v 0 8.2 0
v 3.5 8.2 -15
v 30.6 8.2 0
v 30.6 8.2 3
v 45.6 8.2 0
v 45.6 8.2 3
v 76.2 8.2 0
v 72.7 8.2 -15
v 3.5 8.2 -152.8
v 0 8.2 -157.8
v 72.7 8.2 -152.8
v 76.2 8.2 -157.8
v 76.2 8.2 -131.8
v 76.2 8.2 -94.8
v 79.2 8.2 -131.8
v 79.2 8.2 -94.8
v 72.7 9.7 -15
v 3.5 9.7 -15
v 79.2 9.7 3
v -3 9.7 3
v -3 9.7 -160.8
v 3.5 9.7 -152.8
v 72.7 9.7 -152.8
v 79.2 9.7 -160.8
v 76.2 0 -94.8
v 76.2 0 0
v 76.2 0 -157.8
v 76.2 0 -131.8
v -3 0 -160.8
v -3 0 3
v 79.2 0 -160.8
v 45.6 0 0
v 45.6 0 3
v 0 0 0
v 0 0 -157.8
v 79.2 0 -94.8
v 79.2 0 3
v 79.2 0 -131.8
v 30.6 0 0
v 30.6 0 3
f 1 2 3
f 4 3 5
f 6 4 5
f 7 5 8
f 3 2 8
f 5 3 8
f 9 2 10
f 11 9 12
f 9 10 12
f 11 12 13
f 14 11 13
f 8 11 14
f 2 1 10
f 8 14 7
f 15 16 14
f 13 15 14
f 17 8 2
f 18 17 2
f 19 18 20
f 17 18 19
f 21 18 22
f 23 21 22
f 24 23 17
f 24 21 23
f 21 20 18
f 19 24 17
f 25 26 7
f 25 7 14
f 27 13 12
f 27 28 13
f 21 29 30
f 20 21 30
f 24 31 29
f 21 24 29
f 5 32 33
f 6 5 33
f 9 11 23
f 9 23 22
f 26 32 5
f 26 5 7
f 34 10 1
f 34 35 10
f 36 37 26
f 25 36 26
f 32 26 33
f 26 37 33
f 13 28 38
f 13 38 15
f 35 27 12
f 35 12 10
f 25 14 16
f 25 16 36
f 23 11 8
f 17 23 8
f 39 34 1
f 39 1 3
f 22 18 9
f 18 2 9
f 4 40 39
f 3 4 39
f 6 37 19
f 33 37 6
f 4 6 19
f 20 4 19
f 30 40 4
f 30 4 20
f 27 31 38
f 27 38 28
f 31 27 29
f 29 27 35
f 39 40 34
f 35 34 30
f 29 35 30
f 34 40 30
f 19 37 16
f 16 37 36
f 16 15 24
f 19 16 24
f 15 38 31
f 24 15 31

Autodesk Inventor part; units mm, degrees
ref_plane "YZ Plane" through (0, 0, 0) normal (1, 0, 0) x (0, 1, 0)
ref_plane "XZ Plane" through (0, 0, 0) normal (0, 1, 0) x (-1, 0, 0)
ref_plane "XY Plane" through (0, 0, 0) normal (0, 0, 1) x (1, 0, 0)
sketch "Sketch1" plane through (0, 0, 0) normal (0, 1, 0) x (-1, 0, 0)
  line L0 (0, 0) -> (-76.2, 0)
  line L1 (-76.2, 0) -> (-76.2, -157.8)
  line L2 (-76.2, -157.8) -> (0, -157.8)
  line L3 (0, -157.8) -> (0, 0)
  line L4 (-76.2, -157.8) -> (-79.2, -157.8)
  line L5 (-79.2, -157.8) -> (-79.2, 0)
  line L6 (-79.2, 0) -> (-76.2, 0)
  line L7 (-76.2, 0) -> (-76.2, -157.8)
  line L8 (0, -157.8) -> (3, -157.8)
  line L9 (3, -157.8) -> (3, 0)
  line L10 (3, 0) -> (0, 0)
  line L11 (0, 0) -> (0, -157.8)
  line L12 (3, 0) -> (-79.2, 0)
  line L13 (-79.2, 0) -> (-79.2, 3)
  line L14 (-79.2, 3) -> (3, 3)
  line L15 (3, 3) -> (3, 0)
  line L16 (-30.6, 0) -> (-45.6, 0)
  line L17 (-45.6, 0) -> (-45.6, 3)
  line L18 (-45.6, 3) -> (-30.6, 3)
  line L19 (-30.6, 3) -> (-30.6, 0)
  line L20 (3, -157.8) -> (-79.2, -157.8)
  line L21 (-79.2, -157.8) -> (-79.2, -160.8)
  line L22 (-79.2, -160.8) -> (3, -160.8)
  line L23 (3, -160.8) -> (3, -157.8)
  dimension "d0" = 76.2
  dimension "d1" = 157.8
  dimension "d2" = 3
  dimension "d3" = 3
  dimension "d4" = 3
  dimension "d5" = 15
  dimension "d6" = 33.6
  dimension "d7" = 33.6
  dimension "d8" = 3
extrude "Extrusion1" add sketch "Sketch1" along normal blind 8.2 contours L10 L9 L8 L3 | L0 L19 L14 L15 L10 | L8 L23 L22 L21 L4 L2 | L0 L6 L13 L14 L17 | L4 L5 L6 L1
sketch "Sketch6" plane through (0, 8.2, 0) normal (0, 1, 0) x (1, 0, 0)
  line L0 (79.2, -3) -> (79.2, 160.8) projected
  line L1 (-3, -3) -> (79.2, -3)
  line L2 (79.2, -3) -> (79.2, 15)
  line L3 (79.2, 15) -> (-3, 15)
  line L4 (-3, 15) -> (-3, -3)
  line L5 (-3, 160.8) -> (-3, -3) projected
  line L6 (-3, 160.8) -> (79.2, 160.8)
  line L7 (79.2, 160.8) -> (79.2, 152.8)
  line L8 (79.2, 152.8) -> (-3, 152.8)
  line L9 (-3, 152.8) -> (-3, 160.8)
  line L10 (-3, 15) -> (3.5, 15)
  line L11 (3.5, 15) -> (3.5, 152.8)
  line L12 (3.5, 152.8) -> (-3, 152.8)
  line L13 (-3, 152.8) -> (-3, 15)
  line L14 (79.2, 152.8) -> (72.7, 152.8)
  line L15 (72.7, 152.8) -> (72.7, 15)
  line L16 (72.7, 15) -> (79.2, 15)
  line L17 (79.2, 15) -> (79.2, 152.8)
  point P0 (0, 0)
  dimension "d22" = 18
  dimension "d23" = 8
  dimension "d24" = 6.5
  dimension "d25" = 6.5
extrude "Extrusion5" add sketch "Sketch6" along normal blind 1.5 contours L1 L4 L3 L0 | L3 L15 L8 L0 | L8 L5 L6 L0 | L5 L8 L11 L3
sketch "Sketch7" plane through (76.2, 0, -157.8) normal (-1, 0, 0) x (0, 0, 1)
  line L0 (0, 8.2) -> (157.8, 8.2) projected
  line L1 (0, 0) -> (157.8, 0) projected
  line L2 (26, 8.2) -> (63, 8.2)
  line L3 (63, 8.2) -> (63, 0)
  line L4 (63, 0) -> (26, 0)
  line L5 (26, 0) -> (26, 8.2)
  line L6 (0, 0) -> (0, 8.2) projected
  point P0 (26, 0)
  dimension "d28" = 37
  dimension "d29" = 26
extrude "Extrusion6" cut sketch "Sketch7" against normal blind 8 contours L0 L3 L1 L5
properties part number "caseMain"
